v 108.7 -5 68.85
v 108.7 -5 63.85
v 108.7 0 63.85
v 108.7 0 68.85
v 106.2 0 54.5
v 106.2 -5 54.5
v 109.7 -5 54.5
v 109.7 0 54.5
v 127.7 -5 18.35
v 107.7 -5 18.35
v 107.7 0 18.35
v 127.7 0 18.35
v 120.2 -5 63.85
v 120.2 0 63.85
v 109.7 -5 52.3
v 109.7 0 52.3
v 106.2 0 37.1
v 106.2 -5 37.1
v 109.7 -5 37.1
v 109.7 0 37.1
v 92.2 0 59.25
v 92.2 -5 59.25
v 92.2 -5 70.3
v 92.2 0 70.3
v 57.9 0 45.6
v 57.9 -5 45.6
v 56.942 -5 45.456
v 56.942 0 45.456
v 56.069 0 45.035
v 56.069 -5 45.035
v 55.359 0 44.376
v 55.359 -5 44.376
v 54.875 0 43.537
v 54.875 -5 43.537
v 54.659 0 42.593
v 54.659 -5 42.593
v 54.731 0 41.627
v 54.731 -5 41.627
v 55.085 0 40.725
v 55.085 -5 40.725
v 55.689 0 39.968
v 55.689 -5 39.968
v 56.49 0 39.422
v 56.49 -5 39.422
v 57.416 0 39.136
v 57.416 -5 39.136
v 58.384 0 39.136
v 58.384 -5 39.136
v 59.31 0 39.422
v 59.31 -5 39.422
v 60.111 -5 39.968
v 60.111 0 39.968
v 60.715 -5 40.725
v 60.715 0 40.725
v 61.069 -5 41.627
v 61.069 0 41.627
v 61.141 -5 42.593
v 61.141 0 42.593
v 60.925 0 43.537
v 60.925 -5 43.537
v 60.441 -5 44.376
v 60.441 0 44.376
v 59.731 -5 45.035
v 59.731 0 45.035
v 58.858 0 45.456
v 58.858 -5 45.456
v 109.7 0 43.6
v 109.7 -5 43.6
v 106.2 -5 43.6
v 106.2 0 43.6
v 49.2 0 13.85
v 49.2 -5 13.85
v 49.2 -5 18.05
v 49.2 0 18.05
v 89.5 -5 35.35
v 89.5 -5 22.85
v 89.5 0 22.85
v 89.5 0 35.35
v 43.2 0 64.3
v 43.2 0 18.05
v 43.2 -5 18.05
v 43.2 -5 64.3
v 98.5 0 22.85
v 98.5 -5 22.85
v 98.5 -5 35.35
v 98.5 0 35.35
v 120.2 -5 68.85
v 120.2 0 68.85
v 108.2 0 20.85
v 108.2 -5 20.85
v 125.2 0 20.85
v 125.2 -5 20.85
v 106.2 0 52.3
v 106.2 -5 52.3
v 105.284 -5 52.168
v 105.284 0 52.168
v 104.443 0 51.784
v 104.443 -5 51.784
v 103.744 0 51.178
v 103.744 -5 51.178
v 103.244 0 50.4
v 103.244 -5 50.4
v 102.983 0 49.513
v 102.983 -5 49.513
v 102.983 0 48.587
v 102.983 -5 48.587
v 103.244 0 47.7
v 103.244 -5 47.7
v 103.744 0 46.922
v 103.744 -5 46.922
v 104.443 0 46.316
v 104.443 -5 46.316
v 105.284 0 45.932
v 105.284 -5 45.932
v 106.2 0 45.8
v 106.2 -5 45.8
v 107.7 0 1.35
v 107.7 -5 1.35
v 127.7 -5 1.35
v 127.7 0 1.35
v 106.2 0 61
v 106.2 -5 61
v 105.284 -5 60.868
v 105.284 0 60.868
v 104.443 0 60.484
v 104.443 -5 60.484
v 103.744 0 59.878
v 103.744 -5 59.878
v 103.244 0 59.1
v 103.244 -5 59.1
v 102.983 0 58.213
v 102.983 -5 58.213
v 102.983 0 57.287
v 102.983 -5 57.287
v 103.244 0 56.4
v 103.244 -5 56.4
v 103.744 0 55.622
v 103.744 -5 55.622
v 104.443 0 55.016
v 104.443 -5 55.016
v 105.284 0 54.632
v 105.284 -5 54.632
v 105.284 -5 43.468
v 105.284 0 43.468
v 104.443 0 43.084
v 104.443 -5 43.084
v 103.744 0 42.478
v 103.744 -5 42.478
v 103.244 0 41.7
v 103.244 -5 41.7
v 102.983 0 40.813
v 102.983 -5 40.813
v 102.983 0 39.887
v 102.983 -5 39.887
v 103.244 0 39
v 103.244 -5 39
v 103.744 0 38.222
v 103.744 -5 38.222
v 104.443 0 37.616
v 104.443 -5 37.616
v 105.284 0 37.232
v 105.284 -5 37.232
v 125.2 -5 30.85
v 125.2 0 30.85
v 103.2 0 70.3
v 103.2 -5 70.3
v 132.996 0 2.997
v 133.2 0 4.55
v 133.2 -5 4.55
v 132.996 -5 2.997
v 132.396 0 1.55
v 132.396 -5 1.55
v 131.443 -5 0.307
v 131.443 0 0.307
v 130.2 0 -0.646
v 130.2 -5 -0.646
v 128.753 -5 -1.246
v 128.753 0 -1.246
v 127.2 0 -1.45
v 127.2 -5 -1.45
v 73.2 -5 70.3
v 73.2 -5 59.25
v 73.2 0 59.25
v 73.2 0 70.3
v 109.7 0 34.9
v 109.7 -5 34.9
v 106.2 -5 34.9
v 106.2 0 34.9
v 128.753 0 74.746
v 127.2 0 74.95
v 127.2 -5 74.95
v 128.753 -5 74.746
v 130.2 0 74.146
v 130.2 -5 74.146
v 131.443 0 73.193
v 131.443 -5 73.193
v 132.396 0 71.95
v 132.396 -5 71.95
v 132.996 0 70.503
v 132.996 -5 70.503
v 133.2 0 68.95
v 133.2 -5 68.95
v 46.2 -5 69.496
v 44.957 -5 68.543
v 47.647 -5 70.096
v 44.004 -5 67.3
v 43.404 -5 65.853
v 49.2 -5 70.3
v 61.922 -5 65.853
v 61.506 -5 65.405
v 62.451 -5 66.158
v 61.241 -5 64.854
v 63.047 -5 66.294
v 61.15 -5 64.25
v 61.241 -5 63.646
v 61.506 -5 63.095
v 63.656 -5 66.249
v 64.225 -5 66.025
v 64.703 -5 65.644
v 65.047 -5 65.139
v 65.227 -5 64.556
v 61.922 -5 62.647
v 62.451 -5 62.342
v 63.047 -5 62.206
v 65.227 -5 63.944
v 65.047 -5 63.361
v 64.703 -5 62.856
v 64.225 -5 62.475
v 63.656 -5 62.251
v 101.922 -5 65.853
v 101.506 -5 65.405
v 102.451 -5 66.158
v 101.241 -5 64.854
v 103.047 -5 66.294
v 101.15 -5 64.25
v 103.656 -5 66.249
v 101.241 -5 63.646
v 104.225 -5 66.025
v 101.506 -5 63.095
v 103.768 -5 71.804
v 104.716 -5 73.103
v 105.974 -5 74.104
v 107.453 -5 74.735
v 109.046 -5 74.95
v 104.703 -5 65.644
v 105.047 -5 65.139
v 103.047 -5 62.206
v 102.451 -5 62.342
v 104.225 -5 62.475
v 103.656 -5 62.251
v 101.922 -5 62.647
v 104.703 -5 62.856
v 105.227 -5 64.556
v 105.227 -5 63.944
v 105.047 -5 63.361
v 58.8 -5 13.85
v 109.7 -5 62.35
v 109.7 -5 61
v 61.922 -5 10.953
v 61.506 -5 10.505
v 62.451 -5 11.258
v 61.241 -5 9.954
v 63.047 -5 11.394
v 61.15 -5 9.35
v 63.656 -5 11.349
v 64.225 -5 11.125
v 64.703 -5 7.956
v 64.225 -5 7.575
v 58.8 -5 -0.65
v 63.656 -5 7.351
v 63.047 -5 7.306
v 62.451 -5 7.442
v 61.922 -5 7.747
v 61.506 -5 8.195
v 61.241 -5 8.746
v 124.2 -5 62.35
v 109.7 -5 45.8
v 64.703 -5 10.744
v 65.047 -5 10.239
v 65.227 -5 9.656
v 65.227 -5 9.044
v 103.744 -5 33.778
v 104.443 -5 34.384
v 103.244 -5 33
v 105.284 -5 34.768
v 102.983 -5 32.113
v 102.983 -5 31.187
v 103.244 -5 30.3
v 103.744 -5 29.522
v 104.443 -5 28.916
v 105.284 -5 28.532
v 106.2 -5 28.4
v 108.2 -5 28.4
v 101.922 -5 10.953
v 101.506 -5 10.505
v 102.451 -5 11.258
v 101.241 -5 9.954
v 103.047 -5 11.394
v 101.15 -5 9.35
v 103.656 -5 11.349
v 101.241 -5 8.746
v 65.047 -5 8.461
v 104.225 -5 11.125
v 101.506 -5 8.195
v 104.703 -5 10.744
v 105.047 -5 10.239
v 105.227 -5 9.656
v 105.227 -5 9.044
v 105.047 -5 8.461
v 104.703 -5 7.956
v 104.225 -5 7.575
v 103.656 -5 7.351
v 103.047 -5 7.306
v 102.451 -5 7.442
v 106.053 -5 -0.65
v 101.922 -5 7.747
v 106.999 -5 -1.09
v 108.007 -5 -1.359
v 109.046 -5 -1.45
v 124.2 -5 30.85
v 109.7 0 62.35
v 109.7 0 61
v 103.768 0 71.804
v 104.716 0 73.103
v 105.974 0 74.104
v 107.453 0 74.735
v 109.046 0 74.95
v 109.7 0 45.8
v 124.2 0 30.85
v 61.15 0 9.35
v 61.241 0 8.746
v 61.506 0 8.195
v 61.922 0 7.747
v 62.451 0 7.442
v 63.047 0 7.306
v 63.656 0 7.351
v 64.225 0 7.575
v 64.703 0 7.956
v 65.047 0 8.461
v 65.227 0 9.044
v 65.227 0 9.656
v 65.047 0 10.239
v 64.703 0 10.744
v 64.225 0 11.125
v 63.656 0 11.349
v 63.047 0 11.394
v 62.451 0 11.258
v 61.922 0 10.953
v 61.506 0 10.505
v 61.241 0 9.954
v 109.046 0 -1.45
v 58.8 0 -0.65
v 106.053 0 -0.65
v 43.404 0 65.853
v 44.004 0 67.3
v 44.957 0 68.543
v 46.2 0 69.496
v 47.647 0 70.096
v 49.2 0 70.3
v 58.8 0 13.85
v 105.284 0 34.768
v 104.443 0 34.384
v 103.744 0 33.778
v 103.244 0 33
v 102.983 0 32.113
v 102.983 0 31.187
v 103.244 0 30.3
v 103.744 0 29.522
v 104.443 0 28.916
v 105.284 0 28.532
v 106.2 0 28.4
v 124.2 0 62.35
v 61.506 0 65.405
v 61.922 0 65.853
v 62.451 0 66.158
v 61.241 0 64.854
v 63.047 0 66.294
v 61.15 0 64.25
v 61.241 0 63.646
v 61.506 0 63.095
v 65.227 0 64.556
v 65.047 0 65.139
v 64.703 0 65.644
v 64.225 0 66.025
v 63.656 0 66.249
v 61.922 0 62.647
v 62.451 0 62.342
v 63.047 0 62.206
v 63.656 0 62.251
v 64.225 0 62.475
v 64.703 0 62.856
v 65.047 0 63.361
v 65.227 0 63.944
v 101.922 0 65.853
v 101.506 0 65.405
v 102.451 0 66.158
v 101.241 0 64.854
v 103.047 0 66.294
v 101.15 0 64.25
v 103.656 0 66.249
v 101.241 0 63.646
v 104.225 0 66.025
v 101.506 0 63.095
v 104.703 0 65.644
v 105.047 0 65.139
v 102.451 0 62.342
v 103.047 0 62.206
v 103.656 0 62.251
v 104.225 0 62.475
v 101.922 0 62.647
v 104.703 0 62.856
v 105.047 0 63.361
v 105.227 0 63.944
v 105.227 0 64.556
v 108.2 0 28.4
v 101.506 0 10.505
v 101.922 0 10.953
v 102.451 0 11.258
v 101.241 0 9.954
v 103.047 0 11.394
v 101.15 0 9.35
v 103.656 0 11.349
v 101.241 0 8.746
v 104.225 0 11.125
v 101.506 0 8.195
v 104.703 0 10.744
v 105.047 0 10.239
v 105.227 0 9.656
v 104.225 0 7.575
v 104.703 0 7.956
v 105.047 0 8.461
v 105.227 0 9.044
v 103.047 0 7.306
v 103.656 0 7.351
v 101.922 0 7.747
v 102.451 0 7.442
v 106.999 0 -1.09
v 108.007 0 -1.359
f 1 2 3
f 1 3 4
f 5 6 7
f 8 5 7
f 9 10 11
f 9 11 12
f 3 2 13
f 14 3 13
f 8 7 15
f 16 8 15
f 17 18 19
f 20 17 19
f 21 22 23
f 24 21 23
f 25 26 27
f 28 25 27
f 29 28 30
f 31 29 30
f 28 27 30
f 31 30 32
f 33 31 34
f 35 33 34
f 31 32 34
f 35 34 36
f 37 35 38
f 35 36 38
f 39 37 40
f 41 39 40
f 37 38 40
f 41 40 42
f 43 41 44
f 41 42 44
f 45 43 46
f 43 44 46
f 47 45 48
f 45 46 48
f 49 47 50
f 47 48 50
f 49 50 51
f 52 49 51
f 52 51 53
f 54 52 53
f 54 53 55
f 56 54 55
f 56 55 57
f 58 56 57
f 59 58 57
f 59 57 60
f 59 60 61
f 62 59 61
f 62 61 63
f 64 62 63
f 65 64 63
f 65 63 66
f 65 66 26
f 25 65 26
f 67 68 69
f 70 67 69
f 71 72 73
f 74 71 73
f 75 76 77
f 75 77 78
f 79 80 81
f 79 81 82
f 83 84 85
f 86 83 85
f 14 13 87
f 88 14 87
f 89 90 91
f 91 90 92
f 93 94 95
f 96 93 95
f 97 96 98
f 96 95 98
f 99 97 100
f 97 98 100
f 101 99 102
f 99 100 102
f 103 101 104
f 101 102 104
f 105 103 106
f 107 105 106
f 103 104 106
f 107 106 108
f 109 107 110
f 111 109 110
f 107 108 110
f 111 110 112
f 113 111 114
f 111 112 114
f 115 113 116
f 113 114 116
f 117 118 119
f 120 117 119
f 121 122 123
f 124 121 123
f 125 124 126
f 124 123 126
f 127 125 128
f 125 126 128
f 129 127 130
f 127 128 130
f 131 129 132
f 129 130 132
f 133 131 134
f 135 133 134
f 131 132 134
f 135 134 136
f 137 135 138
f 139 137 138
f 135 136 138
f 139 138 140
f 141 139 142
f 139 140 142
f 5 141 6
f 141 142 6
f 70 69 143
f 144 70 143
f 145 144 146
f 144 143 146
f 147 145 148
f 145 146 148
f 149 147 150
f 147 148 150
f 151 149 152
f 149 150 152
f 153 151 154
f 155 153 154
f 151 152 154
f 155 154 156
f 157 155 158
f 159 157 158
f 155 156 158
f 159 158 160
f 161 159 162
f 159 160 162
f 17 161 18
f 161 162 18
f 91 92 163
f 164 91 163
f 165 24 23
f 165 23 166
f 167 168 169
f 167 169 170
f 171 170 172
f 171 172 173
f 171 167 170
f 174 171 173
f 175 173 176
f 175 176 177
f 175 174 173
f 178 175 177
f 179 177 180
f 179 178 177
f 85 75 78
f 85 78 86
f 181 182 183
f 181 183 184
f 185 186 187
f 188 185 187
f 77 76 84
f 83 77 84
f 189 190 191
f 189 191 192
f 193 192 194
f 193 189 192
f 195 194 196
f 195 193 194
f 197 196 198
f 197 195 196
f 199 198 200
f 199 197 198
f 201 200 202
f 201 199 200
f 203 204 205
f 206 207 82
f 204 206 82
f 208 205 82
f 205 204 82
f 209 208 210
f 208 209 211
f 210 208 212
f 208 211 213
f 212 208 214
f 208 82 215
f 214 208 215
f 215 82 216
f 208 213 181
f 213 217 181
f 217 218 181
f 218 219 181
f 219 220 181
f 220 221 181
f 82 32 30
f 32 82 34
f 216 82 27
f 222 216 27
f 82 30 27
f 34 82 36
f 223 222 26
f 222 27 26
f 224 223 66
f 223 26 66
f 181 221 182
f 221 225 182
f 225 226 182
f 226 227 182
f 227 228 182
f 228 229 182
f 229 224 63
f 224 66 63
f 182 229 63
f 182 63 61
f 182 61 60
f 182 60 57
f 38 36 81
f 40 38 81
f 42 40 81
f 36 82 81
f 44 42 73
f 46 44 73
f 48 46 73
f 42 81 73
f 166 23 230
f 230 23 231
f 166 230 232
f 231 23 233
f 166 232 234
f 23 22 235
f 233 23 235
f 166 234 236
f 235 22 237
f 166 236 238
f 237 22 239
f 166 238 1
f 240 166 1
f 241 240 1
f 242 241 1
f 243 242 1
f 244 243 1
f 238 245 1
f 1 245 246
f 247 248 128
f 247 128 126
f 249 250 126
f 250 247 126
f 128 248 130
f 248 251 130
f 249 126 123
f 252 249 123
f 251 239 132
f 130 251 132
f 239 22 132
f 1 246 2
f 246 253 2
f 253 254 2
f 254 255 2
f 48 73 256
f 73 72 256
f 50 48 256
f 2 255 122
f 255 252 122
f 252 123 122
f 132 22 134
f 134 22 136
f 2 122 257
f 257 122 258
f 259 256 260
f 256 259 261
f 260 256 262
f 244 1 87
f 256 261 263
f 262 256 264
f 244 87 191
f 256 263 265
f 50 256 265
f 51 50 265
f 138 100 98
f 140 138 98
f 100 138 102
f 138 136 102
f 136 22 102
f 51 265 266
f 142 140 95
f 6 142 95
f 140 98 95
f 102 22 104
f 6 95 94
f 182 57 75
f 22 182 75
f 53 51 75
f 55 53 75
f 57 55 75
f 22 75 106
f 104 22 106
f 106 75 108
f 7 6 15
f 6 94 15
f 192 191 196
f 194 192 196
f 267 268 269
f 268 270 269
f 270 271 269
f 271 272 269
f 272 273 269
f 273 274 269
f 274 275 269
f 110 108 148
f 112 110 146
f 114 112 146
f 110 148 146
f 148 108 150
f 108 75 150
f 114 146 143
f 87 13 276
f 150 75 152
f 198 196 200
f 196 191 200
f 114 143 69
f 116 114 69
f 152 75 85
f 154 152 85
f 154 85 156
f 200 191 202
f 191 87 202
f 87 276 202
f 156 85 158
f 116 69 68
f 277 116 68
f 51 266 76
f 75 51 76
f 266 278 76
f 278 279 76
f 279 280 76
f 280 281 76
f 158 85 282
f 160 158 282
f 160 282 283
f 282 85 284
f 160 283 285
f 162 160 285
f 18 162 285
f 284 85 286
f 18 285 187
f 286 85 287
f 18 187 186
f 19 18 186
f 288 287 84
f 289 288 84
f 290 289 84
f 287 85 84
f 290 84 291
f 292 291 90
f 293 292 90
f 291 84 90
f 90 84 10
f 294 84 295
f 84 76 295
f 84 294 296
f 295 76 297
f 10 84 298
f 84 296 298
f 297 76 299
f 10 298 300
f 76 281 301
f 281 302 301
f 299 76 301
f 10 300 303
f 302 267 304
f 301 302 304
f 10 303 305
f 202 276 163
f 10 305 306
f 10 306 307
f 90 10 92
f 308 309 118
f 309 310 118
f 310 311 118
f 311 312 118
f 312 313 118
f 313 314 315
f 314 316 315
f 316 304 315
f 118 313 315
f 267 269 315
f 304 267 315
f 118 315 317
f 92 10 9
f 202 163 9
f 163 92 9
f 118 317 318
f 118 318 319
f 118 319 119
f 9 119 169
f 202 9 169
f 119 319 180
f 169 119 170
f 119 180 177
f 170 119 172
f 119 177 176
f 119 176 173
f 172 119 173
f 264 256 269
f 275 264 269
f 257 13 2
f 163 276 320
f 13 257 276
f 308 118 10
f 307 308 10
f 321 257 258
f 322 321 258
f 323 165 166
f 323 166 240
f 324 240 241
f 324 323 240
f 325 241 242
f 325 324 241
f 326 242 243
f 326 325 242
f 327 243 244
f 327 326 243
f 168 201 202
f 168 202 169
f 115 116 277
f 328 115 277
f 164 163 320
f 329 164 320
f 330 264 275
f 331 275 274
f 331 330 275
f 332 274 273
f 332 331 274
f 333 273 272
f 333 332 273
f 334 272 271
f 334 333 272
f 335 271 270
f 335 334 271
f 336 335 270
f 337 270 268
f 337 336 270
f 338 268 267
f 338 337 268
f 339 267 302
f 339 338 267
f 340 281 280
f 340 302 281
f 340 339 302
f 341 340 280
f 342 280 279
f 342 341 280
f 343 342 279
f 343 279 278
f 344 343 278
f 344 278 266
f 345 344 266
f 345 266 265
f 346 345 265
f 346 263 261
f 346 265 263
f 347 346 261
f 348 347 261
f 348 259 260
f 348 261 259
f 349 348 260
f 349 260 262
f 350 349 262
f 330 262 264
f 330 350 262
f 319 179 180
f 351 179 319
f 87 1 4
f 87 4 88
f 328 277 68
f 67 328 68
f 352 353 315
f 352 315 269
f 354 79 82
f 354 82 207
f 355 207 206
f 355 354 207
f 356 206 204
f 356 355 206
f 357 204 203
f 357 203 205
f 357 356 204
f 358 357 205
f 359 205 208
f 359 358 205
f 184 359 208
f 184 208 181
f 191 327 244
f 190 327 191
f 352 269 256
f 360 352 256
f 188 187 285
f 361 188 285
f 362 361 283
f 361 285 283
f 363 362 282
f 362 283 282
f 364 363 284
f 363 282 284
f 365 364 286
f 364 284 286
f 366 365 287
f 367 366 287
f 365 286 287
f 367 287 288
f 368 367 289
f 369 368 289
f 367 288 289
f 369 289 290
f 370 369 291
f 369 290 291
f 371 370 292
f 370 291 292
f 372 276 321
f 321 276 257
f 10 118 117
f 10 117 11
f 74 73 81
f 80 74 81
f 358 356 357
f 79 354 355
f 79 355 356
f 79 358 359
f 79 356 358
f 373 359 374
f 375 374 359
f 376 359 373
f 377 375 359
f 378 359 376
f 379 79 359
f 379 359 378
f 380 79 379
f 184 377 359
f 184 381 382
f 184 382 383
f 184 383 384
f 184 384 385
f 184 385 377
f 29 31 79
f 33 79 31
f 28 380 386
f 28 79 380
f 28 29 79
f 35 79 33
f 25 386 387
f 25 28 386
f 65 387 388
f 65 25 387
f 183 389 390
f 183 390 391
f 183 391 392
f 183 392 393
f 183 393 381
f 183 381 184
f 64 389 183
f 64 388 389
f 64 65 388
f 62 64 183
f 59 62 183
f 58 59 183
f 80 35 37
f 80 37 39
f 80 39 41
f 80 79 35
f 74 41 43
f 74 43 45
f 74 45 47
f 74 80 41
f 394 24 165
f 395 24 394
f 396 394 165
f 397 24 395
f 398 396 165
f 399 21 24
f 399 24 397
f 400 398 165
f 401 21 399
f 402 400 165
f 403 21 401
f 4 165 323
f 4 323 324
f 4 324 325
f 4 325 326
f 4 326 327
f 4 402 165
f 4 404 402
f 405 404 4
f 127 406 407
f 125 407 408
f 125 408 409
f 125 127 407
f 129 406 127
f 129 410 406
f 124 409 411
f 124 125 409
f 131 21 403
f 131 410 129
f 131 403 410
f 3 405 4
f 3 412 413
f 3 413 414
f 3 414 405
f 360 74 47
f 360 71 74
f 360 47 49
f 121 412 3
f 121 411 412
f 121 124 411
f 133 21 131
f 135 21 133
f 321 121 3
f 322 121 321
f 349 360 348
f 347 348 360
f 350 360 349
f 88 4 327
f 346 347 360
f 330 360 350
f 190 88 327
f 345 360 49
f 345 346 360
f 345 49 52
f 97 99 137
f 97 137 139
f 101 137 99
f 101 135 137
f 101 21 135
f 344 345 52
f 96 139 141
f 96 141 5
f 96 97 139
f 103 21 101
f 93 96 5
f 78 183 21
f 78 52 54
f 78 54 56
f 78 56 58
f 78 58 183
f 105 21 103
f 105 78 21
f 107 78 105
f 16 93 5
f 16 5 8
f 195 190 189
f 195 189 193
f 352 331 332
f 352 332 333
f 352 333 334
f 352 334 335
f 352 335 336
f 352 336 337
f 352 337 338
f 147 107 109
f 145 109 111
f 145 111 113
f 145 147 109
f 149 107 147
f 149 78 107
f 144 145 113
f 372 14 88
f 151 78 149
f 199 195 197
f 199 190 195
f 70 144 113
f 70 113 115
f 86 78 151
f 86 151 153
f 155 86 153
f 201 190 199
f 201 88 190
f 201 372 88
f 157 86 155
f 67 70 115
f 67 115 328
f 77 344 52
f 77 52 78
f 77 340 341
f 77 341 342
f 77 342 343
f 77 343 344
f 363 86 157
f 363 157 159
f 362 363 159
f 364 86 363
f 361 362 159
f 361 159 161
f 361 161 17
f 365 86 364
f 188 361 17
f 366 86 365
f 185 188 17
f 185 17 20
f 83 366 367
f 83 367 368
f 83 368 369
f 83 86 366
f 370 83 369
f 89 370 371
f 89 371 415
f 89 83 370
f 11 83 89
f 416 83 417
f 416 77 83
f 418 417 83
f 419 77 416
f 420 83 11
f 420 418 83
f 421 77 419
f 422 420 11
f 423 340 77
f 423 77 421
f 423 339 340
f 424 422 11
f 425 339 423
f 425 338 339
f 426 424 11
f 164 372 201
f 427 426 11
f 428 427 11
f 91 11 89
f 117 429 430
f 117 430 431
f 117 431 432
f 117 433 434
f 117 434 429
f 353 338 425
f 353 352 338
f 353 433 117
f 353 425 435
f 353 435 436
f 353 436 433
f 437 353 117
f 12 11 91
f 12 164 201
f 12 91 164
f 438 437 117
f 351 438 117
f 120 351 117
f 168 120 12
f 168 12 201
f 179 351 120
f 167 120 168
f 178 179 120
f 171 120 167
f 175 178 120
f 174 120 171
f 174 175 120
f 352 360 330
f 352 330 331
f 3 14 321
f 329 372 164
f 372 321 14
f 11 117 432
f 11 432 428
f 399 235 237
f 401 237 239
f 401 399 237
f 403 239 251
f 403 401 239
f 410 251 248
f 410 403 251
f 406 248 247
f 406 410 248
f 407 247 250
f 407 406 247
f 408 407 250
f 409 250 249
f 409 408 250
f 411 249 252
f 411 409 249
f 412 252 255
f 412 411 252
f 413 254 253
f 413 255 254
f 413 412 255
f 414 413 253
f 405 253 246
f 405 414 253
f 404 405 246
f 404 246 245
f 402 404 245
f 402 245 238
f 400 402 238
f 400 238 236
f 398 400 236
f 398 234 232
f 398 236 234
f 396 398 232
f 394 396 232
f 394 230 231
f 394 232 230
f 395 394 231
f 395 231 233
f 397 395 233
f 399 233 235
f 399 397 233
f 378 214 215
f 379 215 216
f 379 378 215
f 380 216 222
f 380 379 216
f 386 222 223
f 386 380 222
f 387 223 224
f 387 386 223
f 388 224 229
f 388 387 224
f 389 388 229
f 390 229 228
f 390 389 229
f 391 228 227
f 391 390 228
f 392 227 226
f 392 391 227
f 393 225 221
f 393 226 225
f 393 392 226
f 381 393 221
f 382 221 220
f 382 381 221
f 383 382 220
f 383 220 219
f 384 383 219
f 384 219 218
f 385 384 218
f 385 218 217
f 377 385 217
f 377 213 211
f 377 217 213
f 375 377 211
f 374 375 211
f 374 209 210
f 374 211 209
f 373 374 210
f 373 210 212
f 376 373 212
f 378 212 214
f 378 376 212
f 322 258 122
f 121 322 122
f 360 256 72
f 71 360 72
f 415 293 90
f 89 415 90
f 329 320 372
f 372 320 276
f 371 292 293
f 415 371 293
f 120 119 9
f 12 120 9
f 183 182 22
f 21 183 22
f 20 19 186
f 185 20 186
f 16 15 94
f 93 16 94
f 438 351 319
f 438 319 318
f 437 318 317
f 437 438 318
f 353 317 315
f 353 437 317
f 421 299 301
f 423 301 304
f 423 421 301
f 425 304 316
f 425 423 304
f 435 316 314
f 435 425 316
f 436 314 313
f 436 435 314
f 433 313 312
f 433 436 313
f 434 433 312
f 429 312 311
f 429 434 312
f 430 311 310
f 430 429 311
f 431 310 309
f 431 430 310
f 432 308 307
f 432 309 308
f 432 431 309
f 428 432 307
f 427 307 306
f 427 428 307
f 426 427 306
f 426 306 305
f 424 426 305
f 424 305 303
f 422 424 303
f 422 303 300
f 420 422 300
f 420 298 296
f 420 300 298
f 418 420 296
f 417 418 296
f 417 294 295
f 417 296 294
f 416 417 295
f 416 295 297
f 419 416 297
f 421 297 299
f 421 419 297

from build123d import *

# Parameters (mm, degrees)
SKETCH_2_R          = 6.05
SKETCH_2_R_2        = 2.05
EXTRUDE_1_DEPTH     = 5
EXTRUDE_1_2_DEPTH   = 5
EXTRUDE_1_3_DEPTH   = 5
EXTRUDE_1_4_DEPTH   = 5
SKETCH_6_R          = 2.05
EXTRUDE_1_5_DEPTH   = 5
SKETCH_11_R         = 3.25
SKETCH_11_W         = 19
SKETCH_11_H         = 11.05
SKETCH_11_W_2       = 20
SKETCH_11_H_2       = 17
SKETCH_11_W_3       = 9
SKETCH_11_H_3       = 12.5
SKETCH_11_W_4       = 11.5
SKETCH_11_H_4       = 5
CUT_EXTRUDE_4_DEPTH = 151.533194014
CUT_EXTRUDE_5_DEPTH = 153.920706577


with BuildPart() as part:
    # 草图2 → Extrude 1 (new body)
    with BuildSketch(Plane(origin=(0, 0, 0), x_dir=(-1, 0, 0), z_dir=(0, -1, 0))):
        with Locations((-103.2, -9.35)):
            Circle(SKETCH_2_R)
        with Locations((-103.2, -9.35)):
            Circle(SKETCH_2_R_2, mode=Mode.SUBTRACT)
    extrude(amount=EXTRUDE_1_DEPTH)



with BuildPart() as body_2:
    # 草图2 → Extrude 1 2 (new body)
    with BuildSketch(Plane(origin=(0, 0, 0), x_dir=(-1, 0, 0), z_dir=(0, -1, 0))):
        with Locations((-63.2, -9.35)):
            Circle(SKETCH_2_R)
        with Locations((-63.2, -9.35)):
            Circle(SKETCH_2_R_2, mode=Mode.SUBTRACT)
    extrude(amount=EXTRUDE_1_2_DEPTH)


with BuildPart() as body_3:
    # 草图2 → Extrude 1 3 (new body)
    with BuildSketch(Plane(origin=(0, 0, 0), x_dir=(-1, 0, 0), z_dir=(0, -1, 0))):
        with Locations((-63.2, -64.25)):
            Circle(SKETCH_2_R)
        with Locations((-63.2, -64.25)):
            Circle(SKETCH_2_R_2, mode=Mode.SUBTRACT)
    extrude(amount=EXTRUDE_1_3_DEPTH)


with BuildPart() as body_4:
    # 草图2 → Extrude 1 4 (new body)
    with BuildSketch(Plane(origin=(0, 0, 0), x_dir=(-1, 0, 0), z_dir=(0, -1, 0))):
        with Locations((-103.2, -64.25)):
            Circle(SKETCH_2_R)
        with Locations((-103.2, -64.25)):
            Circle(SKETCH_2_R_2, mode=Mode.SUBTRACT)
    extrude(amount=EXTRUDE_1_4_DEPTH)


with BuildPart() as part_1:
    add(part.part)

    add(body_2.part)  # Extrude 1 5 merges body 2

    add(body_3.part)  # Extrude 1 5 merges body 3

    add(body_4.part)  # Extrude 1 5 merges body 4
    # 草图6 → Extrude 1 5 (add)
    with BuildSketch(Plane(origin=(0, 0, 0), x_dir=(1, 0, 0), z_dir=(0, 1, 0))):
        with BuildLine():
            Line((127.2, 1.45), (109.046152581, 1.45))
            ThreePointArc((109.046152581, 1.45), (107.496959242, 1.246550698), (106.052826672, 0.65))
            Line((106.052826672, 0.65), (63.2, 0.65))
            Line((63.2, 0.65), (45.7, 0.65))
            ThreePointArc((45.7, 0.65), (43.932233047, -0.082233047), (43.2, -1.85))
            Line((43.2, -1.85), (43.2, -64.3))
            ThreePointArc((43.2, -64.3), (44.957359313, -68.542640687), (49.2, -70.3))
            Line((49.2, -70.3), (103.2, -70.3))
            ThreePointArc((103.2, -70.3), (105.311182702, -73.645742753), (109.046152581, -74.95))
            Line((109.046152581, -74.95), (127.2, -74.95))
            ThreePointArc((127.2, -74.95), (131.442640687, -73.192640687), (133.2, -68.95))
            Line((133.2, -68.95), (133.2, -4.55))
            ThreePointArc((133.2, -4.55), (131.442640687, -0.307359313), (127.2, 1.45))
        make_face()
        with Locations(Location((103.2, -9.35, 0), (0, 0, 270))):
            Circle(SKETCH_6_R, mode=Mode.SUBTRACT)
        with Locations(Location((103.2, -64.25, 0), (0, 0, 270))):
            Circle(SKETCH_6_R, mode=Mode.SUBTRACT)
        with Locations(Location((63.2, -64.25, 0), (0, 0, 270))):
            Circle(SKETCH_6_R, mode=Mode.SUBTRACT)
        with Locations(Location((63.2, -9.35, 0), (0, 0, 90))):
            Circle(SKETCH_6_R, mode=Mode.SUBTRACT)
    extrude(amount=-EXTRUDE_1_5_DEPTH)

    # 草图11 → 切除-拉伸4 (cut, through all)
    with BuildSketch(Plane(origin=(0, -5, 5), x_dir=(1, 0, 0), z_dir=(0, -1, 0))):
        Polygon((49.2, 13.05), (43.2, 13.05), (43.2, 6.35), (45.8, 6.35), (45.8, -3.15), (58.8, -3.15), (58.8, 8.85), (49.2, 8.85), align=None)
        with Locations(Location((57.9, 37.35, 0), (0, 0, 90))):
            Circle(SKETCH_11_R)
        with Locations((82.7, 59.775)):
            Rectangle(SKETCH_11_W, SKETCH_11_H)
        with Locations((117.7, 4.85)):
            Rectangle(SKETCH_11_W_2, SKETCH_11_H_2)
        with Locations((94, 24.1)):
            Rectangle(SKETCH_11_W_3, SKETCH_11_H_3)
        with Locations((114.45, 61.35)):
            Rectangle(SKETCH_11_W_4, SKETCH_11_H_4)
        with BuildLine():
            ThreePointArc((106.2, 29.9), (102.95, 26.65), (106.2, 23.4))
            Line((106.2, 23.4), (108.2, 23.4))
            Line((108.2, 23.4), (108.2, 15.85))
            Line((108.2, 15.85), (125.2, 15.85))
            Line((125.2, 15.85), (125.2, 25.85))
            Line((125.2, 25.85), (124.2, 25.85))
            Line((124.2, 25.85), (124.2, 57.35))
            Line((124.2, 57.35), (109.7, 57.35))
            Line((109.7, 57.35), (109.7, 56))
            Line((109.7, 56), (106.2, 56))
            ThreePointArc((106.2, 56), (102.95, 52.75), (106.2, 49.5))
            Line((106.2, 49.5), (109.7, 49.5))
            Line((109.7, 49.5), (109.7, 47.3))
            Line((109.7, 47.3), (106.2, 47.3))
            ThreePointArc((106.2, 47.3), (102.95, 44.05), (106.2, 40.8))
            Line((106.2, 40.8), (109.7, 40.8))
            Line((109.7, 40.8), (109.7, 38.6))
            Line((109.7, 38.6), (106.2, 38.6))
            ThreePointArc((106.2, 38.6), (102.95, 35.35), (106.2, 32.1))
            Line((106.2, 32.1), (109.7, 32.1))
            Line((109.7, 32.1), (109.7, 29.9))
            Line((109.7, 29.9), (106.2, 29.9))
        make_face()
    extrude(amount=-CUT_EXTRUDE_4_DEPTH, mode=Mode.SUBTRACT)

    # 草图12 → Cut-Extrude 5 (cut, through all)
    with BuildSketch(Plane.XZ.offset(5)):
        with BuildLine():
            Line((58.8, -0.65), (58.8, 1.85))
            Line((58.8, 1.85), (45.8, 1.85))
            Line((45.8, 1.85), (45.8, 11.35))
            Line((45.8, 11.35), (43.2, 11.35))
            Line((43.2, 11.35), (43.2, 1.85))
            ThreePointArc((43.2, 1.85), (43.932233047, 0.082233047), (45.7, -0.65))
            Line((45.7, -0.65), (58.8, -0.65))
        make_face()
    extrude(amount=-CUT_EXTRUDE_5_DEPTH, mode=Mode.SUBTRACT)


solid = part_1.part
